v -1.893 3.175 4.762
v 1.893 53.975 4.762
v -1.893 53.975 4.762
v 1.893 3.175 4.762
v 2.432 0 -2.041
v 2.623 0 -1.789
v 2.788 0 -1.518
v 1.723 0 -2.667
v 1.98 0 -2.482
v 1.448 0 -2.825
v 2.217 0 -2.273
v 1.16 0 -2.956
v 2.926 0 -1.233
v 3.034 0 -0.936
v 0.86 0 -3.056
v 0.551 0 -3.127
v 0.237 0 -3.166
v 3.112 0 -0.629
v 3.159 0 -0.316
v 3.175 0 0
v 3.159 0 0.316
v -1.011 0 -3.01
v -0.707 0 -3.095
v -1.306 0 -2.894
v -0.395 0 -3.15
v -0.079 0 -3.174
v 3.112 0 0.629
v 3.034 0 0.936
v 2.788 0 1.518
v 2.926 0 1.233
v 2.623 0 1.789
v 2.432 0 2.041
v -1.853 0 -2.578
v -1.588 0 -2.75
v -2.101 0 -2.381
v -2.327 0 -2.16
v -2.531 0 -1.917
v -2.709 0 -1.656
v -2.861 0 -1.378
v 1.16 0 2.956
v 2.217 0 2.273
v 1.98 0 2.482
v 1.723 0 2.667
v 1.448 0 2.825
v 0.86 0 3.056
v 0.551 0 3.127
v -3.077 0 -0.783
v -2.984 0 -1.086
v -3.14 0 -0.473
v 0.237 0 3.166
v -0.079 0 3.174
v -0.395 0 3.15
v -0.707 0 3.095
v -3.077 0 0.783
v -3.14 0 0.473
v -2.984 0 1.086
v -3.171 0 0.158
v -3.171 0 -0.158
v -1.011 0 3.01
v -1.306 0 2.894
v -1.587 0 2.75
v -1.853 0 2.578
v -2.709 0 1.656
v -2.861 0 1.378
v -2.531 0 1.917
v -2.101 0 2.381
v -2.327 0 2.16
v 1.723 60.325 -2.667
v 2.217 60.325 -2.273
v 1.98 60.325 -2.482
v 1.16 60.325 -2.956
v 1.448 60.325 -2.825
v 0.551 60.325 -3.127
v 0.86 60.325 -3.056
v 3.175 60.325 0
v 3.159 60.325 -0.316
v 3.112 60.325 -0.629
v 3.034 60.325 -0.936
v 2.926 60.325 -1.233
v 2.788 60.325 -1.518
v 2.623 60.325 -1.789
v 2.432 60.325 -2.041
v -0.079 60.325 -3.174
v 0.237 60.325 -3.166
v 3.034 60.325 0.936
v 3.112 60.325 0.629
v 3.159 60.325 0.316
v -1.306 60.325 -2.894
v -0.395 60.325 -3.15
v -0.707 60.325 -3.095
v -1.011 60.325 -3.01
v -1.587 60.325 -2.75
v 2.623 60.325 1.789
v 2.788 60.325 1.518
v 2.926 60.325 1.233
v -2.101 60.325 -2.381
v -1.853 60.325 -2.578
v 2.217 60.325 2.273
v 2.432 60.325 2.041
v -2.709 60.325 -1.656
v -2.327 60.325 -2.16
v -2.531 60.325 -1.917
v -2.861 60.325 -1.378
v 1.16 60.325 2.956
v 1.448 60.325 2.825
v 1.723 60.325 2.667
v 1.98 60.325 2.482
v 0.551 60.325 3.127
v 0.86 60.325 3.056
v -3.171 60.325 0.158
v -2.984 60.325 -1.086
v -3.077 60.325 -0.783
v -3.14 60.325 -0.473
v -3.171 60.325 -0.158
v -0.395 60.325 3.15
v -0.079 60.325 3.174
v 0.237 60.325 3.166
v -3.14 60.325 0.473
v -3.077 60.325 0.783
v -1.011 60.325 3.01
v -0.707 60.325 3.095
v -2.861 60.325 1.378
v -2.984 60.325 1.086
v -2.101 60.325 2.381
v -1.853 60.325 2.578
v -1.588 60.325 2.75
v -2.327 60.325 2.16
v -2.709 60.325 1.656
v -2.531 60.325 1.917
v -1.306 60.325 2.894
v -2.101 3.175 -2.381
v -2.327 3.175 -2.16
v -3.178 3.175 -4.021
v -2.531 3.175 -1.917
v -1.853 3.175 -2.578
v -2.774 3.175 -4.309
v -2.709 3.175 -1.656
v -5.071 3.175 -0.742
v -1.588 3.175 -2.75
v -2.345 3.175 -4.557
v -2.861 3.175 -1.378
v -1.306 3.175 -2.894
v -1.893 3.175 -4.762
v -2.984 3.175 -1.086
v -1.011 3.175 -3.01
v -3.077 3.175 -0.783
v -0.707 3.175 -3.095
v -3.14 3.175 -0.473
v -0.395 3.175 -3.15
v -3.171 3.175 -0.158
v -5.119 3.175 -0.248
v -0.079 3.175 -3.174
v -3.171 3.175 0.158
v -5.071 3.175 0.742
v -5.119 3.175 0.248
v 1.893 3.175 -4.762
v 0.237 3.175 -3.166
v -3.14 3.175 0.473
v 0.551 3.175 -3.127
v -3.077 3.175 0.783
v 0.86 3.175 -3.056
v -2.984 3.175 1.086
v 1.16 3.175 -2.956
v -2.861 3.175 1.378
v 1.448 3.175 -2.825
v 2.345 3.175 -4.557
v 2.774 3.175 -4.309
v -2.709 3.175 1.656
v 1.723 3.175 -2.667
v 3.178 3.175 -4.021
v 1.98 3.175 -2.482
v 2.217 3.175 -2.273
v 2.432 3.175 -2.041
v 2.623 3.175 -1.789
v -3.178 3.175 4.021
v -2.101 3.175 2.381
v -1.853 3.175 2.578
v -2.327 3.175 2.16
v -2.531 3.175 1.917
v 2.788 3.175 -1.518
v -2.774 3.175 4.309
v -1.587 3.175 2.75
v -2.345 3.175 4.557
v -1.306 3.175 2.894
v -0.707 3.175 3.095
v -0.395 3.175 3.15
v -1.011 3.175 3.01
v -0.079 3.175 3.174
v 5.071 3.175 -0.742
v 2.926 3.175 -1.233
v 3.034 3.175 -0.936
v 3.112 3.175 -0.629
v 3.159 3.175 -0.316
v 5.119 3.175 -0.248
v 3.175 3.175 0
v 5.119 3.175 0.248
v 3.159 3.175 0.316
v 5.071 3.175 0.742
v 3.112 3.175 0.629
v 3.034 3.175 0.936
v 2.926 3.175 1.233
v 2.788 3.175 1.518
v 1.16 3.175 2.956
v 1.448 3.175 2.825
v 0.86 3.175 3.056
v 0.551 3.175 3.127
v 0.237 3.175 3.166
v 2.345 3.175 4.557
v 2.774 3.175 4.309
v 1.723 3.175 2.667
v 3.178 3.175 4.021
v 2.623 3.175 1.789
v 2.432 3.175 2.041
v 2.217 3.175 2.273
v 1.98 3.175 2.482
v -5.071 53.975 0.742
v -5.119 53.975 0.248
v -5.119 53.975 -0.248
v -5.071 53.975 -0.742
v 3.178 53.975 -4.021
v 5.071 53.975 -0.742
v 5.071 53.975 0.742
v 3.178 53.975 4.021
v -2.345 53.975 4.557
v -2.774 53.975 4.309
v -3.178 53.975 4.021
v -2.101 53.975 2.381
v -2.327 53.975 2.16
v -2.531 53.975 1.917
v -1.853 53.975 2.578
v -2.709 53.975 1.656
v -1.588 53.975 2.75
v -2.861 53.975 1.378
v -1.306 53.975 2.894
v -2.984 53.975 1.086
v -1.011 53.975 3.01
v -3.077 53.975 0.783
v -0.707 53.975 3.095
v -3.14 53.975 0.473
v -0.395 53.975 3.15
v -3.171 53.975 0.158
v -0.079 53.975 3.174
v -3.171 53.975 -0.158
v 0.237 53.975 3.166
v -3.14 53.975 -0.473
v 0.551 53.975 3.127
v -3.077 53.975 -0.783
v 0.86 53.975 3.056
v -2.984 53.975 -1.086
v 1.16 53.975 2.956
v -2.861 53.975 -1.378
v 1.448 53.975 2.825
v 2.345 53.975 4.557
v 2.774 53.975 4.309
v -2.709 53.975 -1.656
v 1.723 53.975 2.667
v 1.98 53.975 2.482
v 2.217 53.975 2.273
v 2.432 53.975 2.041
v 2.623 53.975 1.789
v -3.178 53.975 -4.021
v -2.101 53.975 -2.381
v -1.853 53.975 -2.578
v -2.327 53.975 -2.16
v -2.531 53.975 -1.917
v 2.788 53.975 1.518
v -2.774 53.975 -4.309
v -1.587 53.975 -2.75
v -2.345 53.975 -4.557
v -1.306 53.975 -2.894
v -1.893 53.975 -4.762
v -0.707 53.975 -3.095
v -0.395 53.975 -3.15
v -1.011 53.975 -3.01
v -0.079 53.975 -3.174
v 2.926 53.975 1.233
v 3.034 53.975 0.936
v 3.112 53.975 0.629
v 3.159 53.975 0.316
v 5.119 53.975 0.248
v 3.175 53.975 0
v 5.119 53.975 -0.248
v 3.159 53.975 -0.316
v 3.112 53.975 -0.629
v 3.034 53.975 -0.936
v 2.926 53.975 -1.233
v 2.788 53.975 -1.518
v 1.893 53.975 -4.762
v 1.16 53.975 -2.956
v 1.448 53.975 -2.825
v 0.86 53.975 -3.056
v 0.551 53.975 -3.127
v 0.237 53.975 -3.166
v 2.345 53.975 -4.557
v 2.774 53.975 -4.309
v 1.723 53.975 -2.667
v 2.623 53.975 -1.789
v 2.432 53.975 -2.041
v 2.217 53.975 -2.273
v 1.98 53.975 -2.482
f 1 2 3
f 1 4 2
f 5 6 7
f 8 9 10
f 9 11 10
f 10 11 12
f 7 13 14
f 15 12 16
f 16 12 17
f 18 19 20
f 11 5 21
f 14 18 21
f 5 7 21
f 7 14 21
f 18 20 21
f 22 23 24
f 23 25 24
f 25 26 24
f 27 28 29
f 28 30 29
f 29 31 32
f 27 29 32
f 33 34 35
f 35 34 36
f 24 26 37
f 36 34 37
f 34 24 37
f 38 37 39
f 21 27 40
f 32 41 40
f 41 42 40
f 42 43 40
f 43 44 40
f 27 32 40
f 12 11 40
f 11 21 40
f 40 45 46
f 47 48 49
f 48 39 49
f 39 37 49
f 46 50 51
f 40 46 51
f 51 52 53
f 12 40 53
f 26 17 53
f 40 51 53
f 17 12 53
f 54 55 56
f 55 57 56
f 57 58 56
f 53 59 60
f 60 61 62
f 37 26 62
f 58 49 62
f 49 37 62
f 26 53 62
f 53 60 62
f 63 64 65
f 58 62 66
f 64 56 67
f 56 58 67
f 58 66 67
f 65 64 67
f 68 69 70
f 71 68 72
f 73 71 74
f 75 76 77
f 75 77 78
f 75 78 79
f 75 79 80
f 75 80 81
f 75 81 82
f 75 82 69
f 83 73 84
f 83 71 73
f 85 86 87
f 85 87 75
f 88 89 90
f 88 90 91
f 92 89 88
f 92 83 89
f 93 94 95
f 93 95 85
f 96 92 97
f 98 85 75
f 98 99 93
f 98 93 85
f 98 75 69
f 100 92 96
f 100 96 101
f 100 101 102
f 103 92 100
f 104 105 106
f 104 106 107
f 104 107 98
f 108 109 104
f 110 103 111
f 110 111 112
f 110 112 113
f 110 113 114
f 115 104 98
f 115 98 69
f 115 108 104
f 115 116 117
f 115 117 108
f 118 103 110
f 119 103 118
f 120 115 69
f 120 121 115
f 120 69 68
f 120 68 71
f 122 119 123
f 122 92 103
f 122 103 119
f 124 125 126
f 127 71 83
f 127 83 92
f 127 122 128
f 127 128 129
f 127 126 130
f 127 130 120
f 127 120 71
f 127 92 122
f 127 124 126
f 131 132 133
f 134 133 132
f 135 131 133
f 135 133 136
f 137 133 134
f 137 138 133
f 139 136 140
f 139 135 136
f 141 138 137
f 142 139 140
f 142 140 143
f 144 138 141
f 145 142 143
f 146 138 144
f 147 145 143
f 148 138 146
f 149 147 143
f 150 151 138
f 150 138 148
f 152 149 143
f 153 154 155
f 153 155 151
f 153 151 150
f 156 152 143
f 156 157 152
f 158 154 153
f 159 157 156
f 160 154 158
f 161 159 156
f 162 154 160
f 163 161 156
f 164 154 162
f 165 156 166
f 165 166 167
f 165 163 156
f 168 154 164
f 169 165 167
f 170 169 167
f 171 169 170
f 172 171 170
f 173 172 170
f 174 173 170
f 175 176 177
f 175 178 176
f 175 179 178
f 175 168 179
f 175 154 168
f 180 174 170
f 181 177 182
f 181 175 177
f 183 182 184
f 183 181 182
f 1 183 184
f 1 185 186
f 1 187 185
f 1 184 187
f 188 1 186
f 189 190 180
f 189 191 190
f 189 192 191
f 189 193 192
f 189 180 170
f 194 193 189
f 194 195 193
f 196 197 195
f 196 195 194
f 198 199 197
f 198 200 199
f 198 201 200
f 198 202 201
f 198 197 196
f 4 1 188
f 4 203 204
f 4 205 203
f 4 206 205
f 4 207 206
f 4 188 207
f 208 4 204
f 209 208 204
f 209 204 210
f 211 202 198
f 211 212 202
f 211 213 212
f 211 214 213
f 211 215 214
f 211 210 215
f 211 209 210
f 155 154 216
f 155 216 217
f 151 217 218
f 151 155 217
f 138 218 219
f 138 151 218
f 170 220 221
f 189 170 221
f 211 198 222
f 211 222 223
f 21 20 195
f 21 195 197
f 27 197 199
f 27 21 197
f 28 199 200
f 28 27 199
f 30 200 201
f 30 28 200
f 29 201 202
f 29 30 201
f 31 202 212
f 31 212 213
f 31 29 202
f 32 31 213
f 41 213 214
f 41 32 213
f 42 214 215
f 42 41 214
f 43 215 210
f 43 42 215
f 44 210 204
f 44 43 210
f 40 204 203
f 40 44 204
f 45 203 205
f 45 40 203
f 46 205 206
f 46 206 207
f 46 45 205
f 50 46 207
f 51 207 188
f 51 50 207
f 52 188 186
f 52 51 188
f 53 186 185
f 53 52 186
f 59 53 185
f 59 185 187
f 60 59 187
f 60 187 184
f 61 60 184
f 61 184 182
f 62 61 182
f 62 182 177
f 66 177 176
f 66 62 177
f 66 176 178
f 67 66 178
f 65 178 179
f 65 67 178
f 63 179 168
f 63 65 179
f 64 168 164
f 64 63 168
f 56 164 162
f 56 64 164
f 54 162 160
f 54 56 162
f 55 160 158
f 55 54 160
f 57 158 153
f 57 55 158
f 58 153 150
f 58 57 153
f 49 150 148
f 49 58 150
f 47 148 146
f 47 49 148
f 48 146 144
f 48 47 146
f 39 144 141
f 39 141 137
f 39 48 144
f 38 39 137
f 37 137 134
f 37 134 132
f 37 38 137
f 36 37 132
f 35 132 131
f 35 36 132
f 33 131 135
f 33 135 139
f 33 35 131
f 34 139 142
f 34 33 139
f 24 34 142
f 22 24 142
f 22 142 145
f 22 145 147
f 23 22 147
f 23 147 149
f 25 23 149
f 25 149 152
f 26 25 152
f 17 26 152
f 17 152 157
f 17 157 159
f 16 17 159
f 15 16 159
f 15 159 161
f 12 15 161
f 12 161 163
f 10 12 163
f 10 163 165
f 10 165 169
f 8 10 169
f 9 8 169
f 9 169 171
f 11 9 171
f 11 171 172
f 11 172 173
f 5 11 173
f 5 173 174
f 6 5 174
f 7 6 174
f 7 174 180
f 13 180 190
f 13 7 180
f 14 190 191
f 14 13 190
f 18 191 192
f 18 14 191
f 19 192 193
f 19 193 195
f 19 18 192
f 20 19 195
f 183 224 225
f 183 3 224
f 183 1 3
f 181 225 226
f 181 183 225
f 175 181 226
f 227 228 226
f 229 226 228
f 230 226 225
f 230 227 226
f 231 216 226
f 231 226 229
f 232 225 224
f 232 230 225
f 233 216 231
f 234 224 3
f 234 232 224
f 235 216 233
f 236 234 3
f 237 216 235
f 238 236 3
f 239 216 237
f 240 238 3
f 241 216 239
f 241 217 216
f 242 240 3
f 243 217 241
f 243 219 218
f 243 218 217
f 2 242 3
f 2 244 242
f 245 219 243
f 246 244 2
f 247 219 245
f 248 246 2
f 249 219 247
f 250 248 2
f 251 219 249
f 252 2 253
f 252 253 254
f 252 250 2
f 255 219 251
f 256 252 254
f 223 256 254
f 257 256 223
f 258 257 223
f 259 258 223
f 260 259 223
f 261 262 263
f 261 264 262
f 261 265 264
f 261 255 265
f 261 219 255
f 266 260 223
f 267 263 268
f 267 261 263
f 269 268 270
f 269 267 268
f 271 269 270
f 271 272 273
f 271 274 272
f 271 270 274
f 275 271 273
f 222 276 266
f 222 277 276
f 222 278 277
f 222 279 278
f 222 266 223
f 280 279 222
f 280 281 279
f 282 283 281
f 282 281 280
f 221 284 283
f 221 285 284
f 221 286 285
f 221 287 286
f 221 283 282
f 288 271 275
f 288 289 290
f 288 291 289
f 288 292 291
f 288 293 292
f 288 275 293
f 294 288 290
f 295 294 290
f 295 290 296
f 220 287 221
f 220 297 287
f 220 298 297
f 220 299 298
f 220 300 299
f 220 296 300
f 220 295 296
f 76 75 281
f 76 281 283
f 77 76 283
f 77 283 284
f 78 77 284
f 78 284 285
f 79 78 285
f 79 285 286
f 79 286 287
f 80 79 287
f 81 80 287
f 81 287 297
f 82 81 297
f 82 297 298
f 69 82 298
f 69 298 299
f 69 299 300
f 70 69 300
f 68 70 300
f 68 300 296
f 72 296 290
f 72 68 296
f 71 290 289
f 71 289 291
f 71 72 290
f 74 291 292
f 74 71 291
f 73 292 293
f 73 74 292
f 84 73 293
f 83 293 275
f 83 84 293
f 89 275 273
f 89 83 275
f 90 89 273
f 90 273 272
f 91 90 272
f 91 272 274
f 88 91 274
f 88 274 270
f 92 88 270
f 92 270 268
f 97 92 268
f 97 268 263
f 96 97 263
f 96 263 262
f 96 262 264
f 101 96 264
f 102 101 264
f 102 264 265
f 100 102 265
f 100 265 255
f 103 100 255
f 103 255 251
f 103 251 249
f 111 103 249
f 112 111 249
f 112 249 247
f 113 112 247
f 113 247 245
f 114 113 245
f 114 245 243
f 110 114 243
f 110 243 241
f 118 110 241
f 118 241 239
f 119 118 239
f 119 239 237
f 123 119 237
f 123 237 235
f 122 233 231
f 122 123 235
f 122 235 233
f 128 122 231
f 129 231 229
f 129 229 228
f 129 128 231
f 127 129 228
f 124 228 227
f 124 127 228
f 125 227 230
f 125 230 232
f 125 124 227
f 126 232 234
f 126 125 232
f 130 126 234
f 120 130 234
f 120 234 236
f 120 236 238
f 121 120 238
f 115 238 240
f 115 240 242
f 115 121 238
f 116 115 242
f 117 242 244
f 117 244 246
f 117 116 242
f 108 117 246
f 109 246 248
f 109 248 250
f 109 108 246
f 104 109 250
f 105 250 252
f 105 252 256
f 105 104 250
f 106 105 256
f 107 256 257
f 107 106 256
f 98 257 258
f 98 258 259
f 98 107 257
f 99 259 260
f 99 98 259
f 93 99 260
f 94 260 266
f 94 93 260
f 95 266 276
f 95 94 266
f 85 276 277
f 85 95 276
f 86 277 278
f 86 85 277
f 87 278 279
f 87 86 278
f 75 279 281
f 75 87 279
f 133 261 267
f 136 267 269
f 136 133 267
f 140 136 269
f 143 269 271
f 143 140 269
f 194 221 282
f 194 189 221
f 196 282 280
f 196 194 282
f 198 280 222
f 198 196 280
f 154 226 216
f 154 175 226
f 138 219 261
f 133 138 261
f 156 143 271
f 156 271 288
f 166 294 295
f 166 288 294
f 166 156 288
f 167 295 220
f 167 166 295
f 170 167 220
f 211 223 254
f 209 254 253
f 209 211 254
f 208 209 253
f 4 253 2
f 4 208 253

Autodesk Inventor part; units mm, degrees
ref_plane "YZ Plane" through (0, 0, 0) normal (1, 0, 0) x (0, 1, 0)
ref_plane "XZ Plane" through (0, 0, 0) normal (0, 1, 0) x (-1, 0, 0)
ref_plane "XY Plane" through (0, 0, 0) normal (0, 0, 1) x (1, 0, 0)
sketch "Sketch1" plane through (0, 0, 0) normal (0, 1, 0) x (-1, 0, 0)
  line L0 (-5.4993, 0) -> (-2.7496, 4.7625)
  line L1 (-2.7496, 4.7625) -> (2.7496, 4.7625)
  line L2 (2.7496, 4.7625) -> (5.4993, 0)
  line L3 (5.4993, 0) -> (2.7496, -4.7625)
  line L4 (2.7496, -4.7625) -> (-2.7496, -4.7625)
  line L5 (-2.7496, -4.7625) -> (-5.4993, 0)
  circle A0 centre (0, 0) radius 5.125
  point P0 (1.8932, -4.7625)
  point P1 (3.1778, -4.0208)
  point P2 (5.071, -0.7417)
  point P3 (5.071, 0.7417)
  point P4 (3.1778, 4.0208)
  point P5 (1.8932, 4.7625)
  point P6 (-1.8932, 4.7625)
  point P7 (-3.1778, 4.0208)
  point P8 (-5.071, 0.7417)
  point P9 (-5.071, -0.7417)
  point P10 (-3.1778, -4.0208)
  point P11 (-1.8932, -4.7625)
  dimension "d0" = 9.525
  dimension "d1" = 10.25
extrude "Extrusion1" add sketch "Sketch1" along normal blind 60.325 contours L0 A0 L1 L2 L3 L4 L5
sketch "Sketch2" plane through (0, 0, 0) normal (0, -1, 0) x (1, 0, 0)
  circle A0 centre (0, 0) radius 3.175
  arc A1 (3.1778, 4.0208) -> (1.8932, 4.7625) centre (0, 0) ccw projected
  line L0 (-1.8932, 4.7625) -> (1.8932, 4.7625) projected
  arc A2 (-1.8932, 4.7625) -> (-3.1778, 4.0208) centre (0, 0) ccw projected
  line L1 (-5.071, 0.7417) -> (-3.1778, 4.0208) projected
  arc A3 (-5.071, 0.7417) -> (-5.071, -0.7417) centre (0, 0) ccw projected
  line L2 (-3.1778, -4.0208) -> (-5.071, -0.7417) projected
  arc A4 (-3.1778, -4.0208) -> (-1.8932, -4.7625) centre (0, 0) ccw projected
  line L3 (1.8932, -4.7625) -> (-1.8932, -4.7625) projected
  arc A5 (1.8932, -4.7625) -> (3.1778, -4.0208) centre (0, 0) ccw projected
  line L4 (5.071, -0.7417) -> (3.1778, -4.0208) projected
  arc A6 (5.071, -0.7417) -> (5.071, 0.7417) centre (0, 0) ccw projected
  line L5 (3.1778, 4.0208) -> (5.071, 0.7417) projected
  dimension "d4" = 6.35
extrude "Extrusion2" cut sketch "Sketch2" against normal blind 3.175
sketch "Sketch3" plane through (0, 60.325, 0) normal (0, 1, 0) x (1, 0, 0)
  line L0 (5.071, 0.7417) -> (3.1778, 4.0208) projected
  arc A0 (3.1778, 4.0208) -> (1.8932, 4.7625) centre (0, 0) ccw projected
  line L1 (1.8932, 4.7625) -> (-1.8932, 4.7625) projected
  arc A1 (-1.8932, 4.7625) -> (-3.1778, 4.0208) centre (0, 0) ccw projected
  line L2 (-3.1778, 4.0208) -> (-5.071, 0.7417) projected
  arc A2 (-5.071, 0.7417) -> (-5.071, -0.7417) centre (0, 0) ccw projected
  line L3 (-5.071, -0.7417) -> (-3.1778, -4.0208) projected
  arc A3 (-3.1778, -4.0208) -> (-1.8932, -4.7625) centre (0, 0) ccw projected
  line L4 (-1.8932, -4.7625) -> (1.8932, -4.7625) projected
  arc A4 (1.8932, -4.7625) -> (3.1778, -4.0208) centre (0, 0) ccw projected
  line L5 (3.1778, -4.0208) -> (5.071, -0.7417) projected
  arc A5 (5.071, -0.7417) -> (5.071, 0.7417) centre (0, 0) ccw projected
  circle A6 centre (0, 0) radius 3.175
  dimension "d7" = 6.35
extrude "Extrusion3" cut sketch "Sketch3" against normal blind 6.35
properties part number "DriveShaft" material "Steel, Alloy"
